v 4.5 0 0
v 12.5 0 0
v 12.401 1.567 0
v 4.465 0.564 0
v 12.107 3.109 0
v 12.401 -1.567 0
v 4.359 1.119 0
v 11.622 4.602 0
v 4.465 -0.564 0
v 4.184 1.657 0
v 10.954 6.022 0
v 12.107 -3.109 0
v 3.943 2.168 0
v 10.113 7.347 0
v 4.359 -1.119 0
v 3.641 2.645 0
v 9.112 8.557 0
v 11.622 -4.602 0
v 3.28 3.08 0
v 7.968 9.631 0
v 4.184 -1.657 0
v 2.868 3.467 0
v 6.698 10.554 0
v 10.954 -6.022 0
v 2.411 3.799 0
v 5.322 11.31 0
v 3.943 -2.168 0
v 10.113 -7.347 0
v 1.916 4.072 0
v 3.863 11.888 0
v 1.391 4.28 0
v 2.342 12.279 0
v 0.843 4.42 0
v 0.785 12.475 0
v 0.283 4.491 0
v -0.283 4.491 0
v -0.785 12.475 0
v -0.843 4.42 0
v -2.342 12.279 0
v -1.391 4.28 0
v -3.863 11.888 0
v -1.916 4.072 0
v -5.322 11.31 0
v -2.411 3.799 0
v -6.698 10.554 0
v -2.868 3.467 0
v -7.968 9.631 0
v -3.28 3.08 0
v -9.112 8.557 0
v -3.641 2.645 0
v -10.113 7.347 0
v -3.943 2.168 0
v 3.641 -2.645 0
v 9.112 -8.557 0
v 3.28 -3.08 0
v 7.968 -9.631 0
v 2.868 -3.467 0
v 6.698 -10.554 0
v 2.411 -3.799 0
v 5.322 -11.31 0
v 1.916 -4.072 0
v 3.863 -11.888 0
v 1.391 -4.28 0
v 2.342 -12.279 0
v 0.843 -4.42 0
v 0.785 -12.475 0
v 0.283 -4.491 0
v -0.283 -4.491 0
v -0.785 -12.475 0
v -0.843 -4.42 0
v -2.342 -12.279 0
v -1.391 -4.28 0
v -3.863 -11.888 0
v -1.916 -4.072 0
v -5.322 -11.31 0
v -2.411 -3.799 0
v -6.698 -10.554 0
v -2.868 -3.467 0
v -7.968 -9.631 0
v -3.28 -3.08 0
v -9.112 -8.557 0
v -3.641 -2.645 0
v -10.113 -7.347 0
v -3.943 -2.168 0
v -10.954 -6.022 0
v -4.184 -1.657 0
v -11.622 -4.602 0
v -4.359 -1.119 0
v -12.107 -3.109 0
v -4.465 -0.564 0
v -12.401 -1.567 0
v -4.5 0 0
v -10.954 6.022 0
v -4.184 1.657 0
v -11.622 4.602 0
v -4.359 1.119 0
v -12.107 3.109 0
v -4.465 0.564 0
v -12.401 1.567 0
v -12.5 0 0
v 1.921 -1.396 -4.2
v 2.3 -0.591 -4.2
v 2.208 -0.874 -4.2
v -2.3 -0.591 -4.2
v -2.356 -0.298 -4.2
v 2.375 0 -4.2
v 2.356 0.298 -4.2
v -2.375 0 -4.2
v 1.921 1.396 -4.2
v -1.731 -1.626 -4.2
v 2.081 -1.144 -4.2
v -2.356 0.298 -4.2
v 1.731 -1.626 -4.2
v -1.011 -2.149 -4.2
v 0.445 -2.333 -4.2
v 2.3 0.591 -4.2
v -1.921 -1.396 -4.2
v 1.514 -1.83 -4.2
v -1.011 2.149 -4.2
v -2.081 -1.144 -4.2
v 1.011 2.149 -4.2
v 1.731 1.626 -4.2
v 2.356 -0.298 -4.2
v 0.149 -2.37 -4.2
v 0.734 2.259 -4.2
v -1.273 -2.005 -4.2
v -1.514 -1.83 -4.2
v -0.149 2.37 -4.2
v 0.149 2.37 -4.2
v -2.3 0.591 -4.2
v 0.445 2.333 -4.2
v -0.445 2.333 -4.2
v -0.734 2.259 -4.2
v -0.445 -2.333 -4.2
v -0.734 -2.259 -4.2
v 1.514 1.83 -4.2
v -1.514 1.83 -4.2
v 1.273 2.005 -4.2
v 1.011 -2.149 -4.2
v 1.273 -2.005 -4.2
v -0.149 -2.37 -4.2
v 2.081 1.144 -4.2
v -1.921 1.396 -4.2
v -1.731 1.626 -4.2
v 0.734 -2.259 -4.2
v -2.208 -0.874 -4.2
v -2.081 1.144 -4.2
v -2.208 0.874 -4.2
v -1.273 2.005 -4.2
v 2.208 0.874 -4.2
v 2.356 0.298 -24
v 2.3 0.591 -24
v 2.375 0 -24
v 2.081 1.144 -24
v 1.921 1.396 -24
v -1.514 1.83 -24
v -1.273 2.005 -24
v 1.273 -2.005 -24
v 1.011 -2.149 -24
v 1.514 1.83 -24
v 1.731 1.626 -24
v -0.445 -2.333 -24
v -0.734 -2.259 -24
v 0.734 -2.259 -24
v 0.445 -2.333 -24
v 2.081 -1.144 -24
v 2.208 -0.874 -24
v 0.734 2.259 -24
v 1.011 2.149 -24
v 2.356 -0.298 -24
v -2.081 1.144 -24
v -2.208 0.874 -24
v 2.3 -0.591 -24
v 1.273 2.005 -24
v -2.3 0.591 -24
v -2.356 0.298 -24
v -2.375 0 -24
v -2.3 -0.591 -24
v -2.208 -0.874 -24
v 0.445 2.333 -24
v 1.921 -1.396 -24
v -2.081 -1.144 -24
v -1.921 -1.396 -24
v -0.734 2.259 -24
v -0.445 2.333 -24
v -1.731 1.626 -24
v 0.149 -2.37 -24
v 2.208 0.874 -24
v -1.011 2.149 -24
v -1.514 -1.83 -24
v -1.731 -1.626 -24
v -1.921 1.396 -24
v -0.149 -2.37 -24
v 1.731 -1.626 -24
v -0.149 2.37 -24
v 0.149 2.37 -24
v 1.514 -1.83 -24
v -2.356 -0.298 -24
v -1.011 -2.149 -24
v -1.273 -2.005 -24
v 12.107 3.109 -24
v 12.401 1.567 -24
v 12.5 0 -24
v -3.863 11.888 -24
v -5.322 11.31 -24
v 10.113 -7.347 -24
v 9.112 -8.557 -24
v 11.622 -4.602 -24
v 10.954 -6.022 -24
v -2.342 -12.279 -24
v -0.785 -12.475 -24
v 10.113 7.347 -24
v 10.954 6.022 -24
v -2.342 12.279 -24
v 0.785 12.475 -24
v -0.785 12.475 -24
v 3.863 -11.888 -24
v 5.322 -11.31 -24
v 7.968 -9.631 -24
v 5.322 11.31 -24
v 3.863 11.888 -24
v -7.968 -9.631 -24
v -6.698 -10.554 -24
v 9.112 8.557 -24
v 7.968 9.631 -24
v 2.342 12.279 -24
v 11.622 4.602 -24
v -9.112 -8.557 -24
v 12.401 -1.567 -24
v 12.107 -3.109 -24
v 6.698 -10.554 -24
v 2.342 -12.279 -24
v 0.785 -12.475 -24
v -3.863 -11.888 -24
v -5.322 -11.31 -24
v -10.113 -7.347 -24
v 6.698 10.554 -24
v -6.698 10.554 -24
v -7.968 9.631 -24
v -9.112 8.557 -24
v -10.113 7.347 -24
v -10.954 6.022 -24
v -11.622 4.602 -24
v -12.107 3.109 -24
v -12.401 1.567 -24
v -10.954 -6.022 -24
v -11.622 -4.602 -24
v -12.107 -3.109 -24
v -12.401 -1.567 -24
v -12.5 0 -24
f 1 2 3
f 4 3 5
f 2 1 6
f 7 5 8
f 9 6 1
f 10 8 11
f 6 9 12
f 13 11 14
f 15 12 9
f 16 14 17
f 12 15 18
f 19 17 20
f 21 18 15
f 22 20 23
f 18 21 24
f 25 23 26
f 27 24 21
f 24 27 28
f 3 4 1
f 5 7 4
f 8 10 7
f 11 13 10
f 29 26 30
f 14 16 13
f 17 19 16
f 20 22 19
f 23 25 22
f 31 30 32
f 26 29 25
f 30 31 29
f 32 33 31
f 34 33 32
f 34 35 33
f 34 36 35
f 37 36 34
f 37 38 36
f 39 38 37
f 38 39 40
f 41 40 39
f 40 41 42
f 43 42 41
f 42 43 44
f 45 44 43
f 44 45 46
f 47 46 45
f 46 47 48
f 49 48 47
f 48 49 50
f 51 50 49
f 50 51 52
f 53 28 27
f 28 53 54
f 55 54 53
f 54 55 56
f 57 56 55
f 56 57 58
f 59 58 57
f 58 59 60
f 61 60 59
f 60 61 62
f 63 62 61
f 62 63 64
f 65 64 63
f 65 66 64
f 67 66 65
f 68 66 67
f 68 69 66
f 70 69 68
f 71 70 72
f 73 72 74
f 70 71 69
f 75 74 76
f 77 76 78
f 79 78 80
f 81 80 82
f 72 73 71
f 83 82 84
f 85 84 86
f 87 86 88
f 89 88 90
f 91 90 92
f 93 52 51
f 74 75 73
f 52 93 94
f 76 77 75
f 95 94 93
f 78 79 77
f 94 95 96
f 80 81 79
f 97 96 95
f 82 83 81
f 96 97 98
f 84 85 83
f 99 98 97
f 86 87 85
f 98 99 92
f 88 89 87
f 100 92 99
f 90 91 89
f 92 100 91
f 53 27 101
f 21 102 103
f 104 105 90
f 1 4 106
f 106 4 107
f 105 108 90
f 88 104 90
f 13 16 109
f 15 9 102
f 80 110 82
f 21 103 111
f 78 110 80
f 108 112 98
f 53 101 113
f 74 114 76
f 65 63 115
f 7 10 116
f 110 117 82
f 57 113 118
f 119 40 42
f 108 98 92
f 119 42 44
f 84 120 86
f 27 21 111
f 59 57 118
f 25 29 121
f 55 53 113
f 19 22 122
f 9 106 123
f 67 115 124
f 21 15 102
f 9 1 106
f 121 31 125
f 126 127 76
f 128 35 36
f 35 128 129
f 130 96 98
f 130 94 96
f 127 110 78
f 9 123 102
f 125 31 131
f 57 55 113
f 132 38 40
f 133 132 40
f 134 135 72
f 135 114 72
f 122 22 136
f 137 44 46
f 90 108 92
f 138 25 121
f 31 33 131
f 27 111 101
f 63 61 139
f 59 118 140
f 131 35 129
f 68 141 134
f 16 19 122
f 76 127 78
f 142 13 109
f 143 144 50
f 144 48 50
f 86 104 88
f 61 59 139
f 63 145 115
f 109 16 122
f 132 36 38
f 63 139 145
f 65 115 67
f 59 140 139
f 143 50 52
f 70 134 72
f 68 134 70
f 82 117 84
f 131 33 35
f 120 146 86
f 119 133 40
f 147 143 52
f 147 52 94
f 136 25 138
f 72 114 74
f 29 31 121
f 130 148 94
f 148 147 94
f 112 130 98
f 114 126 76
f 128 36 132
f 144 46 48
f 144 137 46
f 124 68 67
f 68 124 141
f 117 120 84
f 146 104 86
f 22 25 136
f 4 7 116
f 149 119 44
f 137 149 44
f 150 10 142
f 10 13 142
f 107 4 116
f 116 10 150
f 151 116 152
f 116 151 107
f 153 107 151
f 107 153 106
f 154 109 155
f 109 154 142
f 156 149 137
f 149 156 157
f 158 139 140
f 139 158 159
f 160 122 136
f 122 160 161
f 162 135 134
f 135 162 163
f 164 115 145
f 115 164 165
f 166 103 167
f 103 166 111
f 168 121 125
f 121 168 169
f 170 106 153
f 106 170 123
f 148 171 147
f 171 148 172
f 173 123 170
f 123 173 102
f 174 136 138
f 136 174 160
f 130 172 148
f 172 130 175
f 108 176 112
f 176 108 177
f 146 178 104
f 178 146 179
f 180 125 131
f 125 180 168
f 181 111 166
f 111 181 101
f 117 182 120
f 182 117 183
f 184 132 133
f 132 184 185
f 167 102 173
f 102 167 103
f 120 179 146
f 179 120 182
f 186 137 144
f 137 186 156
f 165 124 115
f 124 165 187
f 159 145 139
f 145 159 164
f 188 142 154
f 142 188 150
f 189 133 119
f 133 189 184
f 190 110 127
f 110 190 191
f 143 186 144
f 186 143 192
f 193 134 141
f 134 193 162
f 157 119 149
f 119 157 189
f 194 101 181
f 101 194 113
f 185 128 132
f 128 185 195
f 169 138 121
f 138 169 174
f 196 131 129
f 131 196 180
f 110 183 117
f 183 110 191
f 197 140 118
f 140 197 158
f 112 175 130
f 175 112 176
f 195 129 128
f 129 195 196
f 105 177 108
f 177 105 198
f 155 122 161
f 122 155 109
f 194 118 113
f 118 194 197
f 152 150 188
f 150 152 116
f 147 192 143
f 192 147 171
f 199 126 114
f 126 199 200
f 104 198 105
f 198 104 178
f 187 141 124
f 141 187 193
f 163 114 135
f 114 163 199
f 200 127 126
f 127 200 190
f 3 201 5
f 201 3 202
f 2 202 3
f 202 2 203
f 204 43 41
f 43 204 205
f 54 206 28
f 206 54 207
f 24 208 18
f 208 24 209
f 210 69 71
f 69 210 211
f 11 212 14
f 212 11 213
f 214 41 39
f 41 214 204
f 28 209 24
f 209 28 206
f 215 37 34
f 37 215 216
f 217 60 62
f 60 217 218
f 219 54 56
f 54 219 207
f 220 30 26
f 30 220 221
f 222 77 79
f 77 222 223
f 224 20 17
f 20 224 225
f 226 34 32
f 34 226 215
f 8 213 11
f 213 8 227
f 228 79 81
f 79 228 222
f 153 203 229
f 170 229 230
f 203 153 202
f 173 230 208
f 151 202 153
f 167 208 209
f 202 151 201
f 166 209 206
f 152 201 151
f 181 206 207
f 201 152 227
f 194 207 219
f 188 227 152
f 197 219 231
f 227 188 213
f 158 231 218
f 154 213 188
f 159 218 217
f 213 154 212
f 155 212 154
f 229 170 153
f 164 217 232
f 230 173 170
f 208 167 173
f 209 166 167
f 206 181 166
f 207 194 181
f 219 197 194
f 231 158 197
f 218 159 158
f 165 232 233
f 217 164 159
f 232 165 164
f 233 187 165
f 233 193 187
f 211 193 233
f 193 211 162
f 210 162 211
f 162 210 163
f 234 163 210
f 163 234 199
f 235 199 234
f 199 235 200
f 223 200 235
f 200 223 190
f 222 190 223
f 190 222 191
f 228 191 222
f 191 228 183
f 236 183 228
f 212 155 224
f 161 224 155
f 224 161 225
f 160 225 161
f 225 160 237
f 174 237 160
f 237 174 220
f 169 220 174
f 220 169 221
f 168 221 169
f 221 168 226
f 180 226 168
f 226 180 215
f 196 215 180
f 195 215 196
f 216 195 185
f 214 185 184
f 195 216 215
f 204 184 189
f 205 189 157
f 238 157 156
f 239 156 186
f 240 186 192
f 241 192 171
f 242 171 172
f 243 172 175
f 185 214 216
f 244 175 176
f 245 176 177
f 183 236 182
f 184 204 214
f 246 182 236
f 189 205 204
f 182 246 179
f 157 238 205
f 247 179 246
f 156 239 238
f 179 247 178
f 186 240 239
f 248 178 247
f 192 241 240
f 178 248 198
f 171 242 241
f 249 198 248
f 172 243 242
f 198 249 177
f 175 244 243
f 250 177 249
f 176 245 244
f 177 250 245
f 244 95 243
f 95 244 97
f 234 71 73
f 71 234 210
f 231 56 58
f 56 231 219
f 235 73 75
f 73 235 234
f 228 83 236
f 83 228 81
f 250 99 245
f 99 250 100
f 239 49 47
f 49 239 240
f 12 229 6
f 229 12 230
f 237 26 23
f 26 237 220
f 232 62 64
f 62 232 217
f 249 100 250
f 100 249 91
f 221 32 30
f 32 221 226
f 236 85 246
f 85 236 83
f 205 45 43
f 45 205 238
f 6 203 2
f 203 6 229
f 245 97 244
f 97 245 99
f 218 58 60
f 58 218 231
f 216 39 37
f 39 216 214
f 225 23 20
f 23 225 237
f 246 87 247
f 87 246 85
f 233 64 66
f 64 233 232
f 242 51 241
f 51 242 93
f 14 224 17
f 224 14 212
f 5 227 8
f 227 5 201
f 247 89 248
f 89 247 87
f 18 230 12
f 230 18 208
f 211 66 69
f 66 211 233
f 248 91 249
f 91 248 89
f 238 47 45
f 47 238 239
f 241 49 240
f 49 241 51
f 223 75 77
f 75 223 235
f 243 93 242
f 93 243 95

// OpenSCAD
$fn = 50;

difference() {
	union() {
		translate(v = [0, 0, -24.0]) {
			cylinder(h = 24, r = 12.5);
		}
	}
	union() {
		translate(v = [0, 0, 0]) {
			rotate(a = [0, 0, 0]) {
				difference() {
					union() {
						translate(v = [0, 0, -27.0]) {
							cylinder(h = 27, r = 2.25);
						}
						translate(v = [0, 0, -4.2]) {
							cylinder(h = 4.2, r1 = 2.375, r2 = 4.5);
						}
						translate(v = [0, 0, -27.0]) {
							cylinder(h = 27, r = 2.375);
						}
						translate(v = [0, 0, -27.0]) {
							cylinder(h = 27, r = 2.25);
						}
					}
					union();
				}
			}
		}
	}
}
